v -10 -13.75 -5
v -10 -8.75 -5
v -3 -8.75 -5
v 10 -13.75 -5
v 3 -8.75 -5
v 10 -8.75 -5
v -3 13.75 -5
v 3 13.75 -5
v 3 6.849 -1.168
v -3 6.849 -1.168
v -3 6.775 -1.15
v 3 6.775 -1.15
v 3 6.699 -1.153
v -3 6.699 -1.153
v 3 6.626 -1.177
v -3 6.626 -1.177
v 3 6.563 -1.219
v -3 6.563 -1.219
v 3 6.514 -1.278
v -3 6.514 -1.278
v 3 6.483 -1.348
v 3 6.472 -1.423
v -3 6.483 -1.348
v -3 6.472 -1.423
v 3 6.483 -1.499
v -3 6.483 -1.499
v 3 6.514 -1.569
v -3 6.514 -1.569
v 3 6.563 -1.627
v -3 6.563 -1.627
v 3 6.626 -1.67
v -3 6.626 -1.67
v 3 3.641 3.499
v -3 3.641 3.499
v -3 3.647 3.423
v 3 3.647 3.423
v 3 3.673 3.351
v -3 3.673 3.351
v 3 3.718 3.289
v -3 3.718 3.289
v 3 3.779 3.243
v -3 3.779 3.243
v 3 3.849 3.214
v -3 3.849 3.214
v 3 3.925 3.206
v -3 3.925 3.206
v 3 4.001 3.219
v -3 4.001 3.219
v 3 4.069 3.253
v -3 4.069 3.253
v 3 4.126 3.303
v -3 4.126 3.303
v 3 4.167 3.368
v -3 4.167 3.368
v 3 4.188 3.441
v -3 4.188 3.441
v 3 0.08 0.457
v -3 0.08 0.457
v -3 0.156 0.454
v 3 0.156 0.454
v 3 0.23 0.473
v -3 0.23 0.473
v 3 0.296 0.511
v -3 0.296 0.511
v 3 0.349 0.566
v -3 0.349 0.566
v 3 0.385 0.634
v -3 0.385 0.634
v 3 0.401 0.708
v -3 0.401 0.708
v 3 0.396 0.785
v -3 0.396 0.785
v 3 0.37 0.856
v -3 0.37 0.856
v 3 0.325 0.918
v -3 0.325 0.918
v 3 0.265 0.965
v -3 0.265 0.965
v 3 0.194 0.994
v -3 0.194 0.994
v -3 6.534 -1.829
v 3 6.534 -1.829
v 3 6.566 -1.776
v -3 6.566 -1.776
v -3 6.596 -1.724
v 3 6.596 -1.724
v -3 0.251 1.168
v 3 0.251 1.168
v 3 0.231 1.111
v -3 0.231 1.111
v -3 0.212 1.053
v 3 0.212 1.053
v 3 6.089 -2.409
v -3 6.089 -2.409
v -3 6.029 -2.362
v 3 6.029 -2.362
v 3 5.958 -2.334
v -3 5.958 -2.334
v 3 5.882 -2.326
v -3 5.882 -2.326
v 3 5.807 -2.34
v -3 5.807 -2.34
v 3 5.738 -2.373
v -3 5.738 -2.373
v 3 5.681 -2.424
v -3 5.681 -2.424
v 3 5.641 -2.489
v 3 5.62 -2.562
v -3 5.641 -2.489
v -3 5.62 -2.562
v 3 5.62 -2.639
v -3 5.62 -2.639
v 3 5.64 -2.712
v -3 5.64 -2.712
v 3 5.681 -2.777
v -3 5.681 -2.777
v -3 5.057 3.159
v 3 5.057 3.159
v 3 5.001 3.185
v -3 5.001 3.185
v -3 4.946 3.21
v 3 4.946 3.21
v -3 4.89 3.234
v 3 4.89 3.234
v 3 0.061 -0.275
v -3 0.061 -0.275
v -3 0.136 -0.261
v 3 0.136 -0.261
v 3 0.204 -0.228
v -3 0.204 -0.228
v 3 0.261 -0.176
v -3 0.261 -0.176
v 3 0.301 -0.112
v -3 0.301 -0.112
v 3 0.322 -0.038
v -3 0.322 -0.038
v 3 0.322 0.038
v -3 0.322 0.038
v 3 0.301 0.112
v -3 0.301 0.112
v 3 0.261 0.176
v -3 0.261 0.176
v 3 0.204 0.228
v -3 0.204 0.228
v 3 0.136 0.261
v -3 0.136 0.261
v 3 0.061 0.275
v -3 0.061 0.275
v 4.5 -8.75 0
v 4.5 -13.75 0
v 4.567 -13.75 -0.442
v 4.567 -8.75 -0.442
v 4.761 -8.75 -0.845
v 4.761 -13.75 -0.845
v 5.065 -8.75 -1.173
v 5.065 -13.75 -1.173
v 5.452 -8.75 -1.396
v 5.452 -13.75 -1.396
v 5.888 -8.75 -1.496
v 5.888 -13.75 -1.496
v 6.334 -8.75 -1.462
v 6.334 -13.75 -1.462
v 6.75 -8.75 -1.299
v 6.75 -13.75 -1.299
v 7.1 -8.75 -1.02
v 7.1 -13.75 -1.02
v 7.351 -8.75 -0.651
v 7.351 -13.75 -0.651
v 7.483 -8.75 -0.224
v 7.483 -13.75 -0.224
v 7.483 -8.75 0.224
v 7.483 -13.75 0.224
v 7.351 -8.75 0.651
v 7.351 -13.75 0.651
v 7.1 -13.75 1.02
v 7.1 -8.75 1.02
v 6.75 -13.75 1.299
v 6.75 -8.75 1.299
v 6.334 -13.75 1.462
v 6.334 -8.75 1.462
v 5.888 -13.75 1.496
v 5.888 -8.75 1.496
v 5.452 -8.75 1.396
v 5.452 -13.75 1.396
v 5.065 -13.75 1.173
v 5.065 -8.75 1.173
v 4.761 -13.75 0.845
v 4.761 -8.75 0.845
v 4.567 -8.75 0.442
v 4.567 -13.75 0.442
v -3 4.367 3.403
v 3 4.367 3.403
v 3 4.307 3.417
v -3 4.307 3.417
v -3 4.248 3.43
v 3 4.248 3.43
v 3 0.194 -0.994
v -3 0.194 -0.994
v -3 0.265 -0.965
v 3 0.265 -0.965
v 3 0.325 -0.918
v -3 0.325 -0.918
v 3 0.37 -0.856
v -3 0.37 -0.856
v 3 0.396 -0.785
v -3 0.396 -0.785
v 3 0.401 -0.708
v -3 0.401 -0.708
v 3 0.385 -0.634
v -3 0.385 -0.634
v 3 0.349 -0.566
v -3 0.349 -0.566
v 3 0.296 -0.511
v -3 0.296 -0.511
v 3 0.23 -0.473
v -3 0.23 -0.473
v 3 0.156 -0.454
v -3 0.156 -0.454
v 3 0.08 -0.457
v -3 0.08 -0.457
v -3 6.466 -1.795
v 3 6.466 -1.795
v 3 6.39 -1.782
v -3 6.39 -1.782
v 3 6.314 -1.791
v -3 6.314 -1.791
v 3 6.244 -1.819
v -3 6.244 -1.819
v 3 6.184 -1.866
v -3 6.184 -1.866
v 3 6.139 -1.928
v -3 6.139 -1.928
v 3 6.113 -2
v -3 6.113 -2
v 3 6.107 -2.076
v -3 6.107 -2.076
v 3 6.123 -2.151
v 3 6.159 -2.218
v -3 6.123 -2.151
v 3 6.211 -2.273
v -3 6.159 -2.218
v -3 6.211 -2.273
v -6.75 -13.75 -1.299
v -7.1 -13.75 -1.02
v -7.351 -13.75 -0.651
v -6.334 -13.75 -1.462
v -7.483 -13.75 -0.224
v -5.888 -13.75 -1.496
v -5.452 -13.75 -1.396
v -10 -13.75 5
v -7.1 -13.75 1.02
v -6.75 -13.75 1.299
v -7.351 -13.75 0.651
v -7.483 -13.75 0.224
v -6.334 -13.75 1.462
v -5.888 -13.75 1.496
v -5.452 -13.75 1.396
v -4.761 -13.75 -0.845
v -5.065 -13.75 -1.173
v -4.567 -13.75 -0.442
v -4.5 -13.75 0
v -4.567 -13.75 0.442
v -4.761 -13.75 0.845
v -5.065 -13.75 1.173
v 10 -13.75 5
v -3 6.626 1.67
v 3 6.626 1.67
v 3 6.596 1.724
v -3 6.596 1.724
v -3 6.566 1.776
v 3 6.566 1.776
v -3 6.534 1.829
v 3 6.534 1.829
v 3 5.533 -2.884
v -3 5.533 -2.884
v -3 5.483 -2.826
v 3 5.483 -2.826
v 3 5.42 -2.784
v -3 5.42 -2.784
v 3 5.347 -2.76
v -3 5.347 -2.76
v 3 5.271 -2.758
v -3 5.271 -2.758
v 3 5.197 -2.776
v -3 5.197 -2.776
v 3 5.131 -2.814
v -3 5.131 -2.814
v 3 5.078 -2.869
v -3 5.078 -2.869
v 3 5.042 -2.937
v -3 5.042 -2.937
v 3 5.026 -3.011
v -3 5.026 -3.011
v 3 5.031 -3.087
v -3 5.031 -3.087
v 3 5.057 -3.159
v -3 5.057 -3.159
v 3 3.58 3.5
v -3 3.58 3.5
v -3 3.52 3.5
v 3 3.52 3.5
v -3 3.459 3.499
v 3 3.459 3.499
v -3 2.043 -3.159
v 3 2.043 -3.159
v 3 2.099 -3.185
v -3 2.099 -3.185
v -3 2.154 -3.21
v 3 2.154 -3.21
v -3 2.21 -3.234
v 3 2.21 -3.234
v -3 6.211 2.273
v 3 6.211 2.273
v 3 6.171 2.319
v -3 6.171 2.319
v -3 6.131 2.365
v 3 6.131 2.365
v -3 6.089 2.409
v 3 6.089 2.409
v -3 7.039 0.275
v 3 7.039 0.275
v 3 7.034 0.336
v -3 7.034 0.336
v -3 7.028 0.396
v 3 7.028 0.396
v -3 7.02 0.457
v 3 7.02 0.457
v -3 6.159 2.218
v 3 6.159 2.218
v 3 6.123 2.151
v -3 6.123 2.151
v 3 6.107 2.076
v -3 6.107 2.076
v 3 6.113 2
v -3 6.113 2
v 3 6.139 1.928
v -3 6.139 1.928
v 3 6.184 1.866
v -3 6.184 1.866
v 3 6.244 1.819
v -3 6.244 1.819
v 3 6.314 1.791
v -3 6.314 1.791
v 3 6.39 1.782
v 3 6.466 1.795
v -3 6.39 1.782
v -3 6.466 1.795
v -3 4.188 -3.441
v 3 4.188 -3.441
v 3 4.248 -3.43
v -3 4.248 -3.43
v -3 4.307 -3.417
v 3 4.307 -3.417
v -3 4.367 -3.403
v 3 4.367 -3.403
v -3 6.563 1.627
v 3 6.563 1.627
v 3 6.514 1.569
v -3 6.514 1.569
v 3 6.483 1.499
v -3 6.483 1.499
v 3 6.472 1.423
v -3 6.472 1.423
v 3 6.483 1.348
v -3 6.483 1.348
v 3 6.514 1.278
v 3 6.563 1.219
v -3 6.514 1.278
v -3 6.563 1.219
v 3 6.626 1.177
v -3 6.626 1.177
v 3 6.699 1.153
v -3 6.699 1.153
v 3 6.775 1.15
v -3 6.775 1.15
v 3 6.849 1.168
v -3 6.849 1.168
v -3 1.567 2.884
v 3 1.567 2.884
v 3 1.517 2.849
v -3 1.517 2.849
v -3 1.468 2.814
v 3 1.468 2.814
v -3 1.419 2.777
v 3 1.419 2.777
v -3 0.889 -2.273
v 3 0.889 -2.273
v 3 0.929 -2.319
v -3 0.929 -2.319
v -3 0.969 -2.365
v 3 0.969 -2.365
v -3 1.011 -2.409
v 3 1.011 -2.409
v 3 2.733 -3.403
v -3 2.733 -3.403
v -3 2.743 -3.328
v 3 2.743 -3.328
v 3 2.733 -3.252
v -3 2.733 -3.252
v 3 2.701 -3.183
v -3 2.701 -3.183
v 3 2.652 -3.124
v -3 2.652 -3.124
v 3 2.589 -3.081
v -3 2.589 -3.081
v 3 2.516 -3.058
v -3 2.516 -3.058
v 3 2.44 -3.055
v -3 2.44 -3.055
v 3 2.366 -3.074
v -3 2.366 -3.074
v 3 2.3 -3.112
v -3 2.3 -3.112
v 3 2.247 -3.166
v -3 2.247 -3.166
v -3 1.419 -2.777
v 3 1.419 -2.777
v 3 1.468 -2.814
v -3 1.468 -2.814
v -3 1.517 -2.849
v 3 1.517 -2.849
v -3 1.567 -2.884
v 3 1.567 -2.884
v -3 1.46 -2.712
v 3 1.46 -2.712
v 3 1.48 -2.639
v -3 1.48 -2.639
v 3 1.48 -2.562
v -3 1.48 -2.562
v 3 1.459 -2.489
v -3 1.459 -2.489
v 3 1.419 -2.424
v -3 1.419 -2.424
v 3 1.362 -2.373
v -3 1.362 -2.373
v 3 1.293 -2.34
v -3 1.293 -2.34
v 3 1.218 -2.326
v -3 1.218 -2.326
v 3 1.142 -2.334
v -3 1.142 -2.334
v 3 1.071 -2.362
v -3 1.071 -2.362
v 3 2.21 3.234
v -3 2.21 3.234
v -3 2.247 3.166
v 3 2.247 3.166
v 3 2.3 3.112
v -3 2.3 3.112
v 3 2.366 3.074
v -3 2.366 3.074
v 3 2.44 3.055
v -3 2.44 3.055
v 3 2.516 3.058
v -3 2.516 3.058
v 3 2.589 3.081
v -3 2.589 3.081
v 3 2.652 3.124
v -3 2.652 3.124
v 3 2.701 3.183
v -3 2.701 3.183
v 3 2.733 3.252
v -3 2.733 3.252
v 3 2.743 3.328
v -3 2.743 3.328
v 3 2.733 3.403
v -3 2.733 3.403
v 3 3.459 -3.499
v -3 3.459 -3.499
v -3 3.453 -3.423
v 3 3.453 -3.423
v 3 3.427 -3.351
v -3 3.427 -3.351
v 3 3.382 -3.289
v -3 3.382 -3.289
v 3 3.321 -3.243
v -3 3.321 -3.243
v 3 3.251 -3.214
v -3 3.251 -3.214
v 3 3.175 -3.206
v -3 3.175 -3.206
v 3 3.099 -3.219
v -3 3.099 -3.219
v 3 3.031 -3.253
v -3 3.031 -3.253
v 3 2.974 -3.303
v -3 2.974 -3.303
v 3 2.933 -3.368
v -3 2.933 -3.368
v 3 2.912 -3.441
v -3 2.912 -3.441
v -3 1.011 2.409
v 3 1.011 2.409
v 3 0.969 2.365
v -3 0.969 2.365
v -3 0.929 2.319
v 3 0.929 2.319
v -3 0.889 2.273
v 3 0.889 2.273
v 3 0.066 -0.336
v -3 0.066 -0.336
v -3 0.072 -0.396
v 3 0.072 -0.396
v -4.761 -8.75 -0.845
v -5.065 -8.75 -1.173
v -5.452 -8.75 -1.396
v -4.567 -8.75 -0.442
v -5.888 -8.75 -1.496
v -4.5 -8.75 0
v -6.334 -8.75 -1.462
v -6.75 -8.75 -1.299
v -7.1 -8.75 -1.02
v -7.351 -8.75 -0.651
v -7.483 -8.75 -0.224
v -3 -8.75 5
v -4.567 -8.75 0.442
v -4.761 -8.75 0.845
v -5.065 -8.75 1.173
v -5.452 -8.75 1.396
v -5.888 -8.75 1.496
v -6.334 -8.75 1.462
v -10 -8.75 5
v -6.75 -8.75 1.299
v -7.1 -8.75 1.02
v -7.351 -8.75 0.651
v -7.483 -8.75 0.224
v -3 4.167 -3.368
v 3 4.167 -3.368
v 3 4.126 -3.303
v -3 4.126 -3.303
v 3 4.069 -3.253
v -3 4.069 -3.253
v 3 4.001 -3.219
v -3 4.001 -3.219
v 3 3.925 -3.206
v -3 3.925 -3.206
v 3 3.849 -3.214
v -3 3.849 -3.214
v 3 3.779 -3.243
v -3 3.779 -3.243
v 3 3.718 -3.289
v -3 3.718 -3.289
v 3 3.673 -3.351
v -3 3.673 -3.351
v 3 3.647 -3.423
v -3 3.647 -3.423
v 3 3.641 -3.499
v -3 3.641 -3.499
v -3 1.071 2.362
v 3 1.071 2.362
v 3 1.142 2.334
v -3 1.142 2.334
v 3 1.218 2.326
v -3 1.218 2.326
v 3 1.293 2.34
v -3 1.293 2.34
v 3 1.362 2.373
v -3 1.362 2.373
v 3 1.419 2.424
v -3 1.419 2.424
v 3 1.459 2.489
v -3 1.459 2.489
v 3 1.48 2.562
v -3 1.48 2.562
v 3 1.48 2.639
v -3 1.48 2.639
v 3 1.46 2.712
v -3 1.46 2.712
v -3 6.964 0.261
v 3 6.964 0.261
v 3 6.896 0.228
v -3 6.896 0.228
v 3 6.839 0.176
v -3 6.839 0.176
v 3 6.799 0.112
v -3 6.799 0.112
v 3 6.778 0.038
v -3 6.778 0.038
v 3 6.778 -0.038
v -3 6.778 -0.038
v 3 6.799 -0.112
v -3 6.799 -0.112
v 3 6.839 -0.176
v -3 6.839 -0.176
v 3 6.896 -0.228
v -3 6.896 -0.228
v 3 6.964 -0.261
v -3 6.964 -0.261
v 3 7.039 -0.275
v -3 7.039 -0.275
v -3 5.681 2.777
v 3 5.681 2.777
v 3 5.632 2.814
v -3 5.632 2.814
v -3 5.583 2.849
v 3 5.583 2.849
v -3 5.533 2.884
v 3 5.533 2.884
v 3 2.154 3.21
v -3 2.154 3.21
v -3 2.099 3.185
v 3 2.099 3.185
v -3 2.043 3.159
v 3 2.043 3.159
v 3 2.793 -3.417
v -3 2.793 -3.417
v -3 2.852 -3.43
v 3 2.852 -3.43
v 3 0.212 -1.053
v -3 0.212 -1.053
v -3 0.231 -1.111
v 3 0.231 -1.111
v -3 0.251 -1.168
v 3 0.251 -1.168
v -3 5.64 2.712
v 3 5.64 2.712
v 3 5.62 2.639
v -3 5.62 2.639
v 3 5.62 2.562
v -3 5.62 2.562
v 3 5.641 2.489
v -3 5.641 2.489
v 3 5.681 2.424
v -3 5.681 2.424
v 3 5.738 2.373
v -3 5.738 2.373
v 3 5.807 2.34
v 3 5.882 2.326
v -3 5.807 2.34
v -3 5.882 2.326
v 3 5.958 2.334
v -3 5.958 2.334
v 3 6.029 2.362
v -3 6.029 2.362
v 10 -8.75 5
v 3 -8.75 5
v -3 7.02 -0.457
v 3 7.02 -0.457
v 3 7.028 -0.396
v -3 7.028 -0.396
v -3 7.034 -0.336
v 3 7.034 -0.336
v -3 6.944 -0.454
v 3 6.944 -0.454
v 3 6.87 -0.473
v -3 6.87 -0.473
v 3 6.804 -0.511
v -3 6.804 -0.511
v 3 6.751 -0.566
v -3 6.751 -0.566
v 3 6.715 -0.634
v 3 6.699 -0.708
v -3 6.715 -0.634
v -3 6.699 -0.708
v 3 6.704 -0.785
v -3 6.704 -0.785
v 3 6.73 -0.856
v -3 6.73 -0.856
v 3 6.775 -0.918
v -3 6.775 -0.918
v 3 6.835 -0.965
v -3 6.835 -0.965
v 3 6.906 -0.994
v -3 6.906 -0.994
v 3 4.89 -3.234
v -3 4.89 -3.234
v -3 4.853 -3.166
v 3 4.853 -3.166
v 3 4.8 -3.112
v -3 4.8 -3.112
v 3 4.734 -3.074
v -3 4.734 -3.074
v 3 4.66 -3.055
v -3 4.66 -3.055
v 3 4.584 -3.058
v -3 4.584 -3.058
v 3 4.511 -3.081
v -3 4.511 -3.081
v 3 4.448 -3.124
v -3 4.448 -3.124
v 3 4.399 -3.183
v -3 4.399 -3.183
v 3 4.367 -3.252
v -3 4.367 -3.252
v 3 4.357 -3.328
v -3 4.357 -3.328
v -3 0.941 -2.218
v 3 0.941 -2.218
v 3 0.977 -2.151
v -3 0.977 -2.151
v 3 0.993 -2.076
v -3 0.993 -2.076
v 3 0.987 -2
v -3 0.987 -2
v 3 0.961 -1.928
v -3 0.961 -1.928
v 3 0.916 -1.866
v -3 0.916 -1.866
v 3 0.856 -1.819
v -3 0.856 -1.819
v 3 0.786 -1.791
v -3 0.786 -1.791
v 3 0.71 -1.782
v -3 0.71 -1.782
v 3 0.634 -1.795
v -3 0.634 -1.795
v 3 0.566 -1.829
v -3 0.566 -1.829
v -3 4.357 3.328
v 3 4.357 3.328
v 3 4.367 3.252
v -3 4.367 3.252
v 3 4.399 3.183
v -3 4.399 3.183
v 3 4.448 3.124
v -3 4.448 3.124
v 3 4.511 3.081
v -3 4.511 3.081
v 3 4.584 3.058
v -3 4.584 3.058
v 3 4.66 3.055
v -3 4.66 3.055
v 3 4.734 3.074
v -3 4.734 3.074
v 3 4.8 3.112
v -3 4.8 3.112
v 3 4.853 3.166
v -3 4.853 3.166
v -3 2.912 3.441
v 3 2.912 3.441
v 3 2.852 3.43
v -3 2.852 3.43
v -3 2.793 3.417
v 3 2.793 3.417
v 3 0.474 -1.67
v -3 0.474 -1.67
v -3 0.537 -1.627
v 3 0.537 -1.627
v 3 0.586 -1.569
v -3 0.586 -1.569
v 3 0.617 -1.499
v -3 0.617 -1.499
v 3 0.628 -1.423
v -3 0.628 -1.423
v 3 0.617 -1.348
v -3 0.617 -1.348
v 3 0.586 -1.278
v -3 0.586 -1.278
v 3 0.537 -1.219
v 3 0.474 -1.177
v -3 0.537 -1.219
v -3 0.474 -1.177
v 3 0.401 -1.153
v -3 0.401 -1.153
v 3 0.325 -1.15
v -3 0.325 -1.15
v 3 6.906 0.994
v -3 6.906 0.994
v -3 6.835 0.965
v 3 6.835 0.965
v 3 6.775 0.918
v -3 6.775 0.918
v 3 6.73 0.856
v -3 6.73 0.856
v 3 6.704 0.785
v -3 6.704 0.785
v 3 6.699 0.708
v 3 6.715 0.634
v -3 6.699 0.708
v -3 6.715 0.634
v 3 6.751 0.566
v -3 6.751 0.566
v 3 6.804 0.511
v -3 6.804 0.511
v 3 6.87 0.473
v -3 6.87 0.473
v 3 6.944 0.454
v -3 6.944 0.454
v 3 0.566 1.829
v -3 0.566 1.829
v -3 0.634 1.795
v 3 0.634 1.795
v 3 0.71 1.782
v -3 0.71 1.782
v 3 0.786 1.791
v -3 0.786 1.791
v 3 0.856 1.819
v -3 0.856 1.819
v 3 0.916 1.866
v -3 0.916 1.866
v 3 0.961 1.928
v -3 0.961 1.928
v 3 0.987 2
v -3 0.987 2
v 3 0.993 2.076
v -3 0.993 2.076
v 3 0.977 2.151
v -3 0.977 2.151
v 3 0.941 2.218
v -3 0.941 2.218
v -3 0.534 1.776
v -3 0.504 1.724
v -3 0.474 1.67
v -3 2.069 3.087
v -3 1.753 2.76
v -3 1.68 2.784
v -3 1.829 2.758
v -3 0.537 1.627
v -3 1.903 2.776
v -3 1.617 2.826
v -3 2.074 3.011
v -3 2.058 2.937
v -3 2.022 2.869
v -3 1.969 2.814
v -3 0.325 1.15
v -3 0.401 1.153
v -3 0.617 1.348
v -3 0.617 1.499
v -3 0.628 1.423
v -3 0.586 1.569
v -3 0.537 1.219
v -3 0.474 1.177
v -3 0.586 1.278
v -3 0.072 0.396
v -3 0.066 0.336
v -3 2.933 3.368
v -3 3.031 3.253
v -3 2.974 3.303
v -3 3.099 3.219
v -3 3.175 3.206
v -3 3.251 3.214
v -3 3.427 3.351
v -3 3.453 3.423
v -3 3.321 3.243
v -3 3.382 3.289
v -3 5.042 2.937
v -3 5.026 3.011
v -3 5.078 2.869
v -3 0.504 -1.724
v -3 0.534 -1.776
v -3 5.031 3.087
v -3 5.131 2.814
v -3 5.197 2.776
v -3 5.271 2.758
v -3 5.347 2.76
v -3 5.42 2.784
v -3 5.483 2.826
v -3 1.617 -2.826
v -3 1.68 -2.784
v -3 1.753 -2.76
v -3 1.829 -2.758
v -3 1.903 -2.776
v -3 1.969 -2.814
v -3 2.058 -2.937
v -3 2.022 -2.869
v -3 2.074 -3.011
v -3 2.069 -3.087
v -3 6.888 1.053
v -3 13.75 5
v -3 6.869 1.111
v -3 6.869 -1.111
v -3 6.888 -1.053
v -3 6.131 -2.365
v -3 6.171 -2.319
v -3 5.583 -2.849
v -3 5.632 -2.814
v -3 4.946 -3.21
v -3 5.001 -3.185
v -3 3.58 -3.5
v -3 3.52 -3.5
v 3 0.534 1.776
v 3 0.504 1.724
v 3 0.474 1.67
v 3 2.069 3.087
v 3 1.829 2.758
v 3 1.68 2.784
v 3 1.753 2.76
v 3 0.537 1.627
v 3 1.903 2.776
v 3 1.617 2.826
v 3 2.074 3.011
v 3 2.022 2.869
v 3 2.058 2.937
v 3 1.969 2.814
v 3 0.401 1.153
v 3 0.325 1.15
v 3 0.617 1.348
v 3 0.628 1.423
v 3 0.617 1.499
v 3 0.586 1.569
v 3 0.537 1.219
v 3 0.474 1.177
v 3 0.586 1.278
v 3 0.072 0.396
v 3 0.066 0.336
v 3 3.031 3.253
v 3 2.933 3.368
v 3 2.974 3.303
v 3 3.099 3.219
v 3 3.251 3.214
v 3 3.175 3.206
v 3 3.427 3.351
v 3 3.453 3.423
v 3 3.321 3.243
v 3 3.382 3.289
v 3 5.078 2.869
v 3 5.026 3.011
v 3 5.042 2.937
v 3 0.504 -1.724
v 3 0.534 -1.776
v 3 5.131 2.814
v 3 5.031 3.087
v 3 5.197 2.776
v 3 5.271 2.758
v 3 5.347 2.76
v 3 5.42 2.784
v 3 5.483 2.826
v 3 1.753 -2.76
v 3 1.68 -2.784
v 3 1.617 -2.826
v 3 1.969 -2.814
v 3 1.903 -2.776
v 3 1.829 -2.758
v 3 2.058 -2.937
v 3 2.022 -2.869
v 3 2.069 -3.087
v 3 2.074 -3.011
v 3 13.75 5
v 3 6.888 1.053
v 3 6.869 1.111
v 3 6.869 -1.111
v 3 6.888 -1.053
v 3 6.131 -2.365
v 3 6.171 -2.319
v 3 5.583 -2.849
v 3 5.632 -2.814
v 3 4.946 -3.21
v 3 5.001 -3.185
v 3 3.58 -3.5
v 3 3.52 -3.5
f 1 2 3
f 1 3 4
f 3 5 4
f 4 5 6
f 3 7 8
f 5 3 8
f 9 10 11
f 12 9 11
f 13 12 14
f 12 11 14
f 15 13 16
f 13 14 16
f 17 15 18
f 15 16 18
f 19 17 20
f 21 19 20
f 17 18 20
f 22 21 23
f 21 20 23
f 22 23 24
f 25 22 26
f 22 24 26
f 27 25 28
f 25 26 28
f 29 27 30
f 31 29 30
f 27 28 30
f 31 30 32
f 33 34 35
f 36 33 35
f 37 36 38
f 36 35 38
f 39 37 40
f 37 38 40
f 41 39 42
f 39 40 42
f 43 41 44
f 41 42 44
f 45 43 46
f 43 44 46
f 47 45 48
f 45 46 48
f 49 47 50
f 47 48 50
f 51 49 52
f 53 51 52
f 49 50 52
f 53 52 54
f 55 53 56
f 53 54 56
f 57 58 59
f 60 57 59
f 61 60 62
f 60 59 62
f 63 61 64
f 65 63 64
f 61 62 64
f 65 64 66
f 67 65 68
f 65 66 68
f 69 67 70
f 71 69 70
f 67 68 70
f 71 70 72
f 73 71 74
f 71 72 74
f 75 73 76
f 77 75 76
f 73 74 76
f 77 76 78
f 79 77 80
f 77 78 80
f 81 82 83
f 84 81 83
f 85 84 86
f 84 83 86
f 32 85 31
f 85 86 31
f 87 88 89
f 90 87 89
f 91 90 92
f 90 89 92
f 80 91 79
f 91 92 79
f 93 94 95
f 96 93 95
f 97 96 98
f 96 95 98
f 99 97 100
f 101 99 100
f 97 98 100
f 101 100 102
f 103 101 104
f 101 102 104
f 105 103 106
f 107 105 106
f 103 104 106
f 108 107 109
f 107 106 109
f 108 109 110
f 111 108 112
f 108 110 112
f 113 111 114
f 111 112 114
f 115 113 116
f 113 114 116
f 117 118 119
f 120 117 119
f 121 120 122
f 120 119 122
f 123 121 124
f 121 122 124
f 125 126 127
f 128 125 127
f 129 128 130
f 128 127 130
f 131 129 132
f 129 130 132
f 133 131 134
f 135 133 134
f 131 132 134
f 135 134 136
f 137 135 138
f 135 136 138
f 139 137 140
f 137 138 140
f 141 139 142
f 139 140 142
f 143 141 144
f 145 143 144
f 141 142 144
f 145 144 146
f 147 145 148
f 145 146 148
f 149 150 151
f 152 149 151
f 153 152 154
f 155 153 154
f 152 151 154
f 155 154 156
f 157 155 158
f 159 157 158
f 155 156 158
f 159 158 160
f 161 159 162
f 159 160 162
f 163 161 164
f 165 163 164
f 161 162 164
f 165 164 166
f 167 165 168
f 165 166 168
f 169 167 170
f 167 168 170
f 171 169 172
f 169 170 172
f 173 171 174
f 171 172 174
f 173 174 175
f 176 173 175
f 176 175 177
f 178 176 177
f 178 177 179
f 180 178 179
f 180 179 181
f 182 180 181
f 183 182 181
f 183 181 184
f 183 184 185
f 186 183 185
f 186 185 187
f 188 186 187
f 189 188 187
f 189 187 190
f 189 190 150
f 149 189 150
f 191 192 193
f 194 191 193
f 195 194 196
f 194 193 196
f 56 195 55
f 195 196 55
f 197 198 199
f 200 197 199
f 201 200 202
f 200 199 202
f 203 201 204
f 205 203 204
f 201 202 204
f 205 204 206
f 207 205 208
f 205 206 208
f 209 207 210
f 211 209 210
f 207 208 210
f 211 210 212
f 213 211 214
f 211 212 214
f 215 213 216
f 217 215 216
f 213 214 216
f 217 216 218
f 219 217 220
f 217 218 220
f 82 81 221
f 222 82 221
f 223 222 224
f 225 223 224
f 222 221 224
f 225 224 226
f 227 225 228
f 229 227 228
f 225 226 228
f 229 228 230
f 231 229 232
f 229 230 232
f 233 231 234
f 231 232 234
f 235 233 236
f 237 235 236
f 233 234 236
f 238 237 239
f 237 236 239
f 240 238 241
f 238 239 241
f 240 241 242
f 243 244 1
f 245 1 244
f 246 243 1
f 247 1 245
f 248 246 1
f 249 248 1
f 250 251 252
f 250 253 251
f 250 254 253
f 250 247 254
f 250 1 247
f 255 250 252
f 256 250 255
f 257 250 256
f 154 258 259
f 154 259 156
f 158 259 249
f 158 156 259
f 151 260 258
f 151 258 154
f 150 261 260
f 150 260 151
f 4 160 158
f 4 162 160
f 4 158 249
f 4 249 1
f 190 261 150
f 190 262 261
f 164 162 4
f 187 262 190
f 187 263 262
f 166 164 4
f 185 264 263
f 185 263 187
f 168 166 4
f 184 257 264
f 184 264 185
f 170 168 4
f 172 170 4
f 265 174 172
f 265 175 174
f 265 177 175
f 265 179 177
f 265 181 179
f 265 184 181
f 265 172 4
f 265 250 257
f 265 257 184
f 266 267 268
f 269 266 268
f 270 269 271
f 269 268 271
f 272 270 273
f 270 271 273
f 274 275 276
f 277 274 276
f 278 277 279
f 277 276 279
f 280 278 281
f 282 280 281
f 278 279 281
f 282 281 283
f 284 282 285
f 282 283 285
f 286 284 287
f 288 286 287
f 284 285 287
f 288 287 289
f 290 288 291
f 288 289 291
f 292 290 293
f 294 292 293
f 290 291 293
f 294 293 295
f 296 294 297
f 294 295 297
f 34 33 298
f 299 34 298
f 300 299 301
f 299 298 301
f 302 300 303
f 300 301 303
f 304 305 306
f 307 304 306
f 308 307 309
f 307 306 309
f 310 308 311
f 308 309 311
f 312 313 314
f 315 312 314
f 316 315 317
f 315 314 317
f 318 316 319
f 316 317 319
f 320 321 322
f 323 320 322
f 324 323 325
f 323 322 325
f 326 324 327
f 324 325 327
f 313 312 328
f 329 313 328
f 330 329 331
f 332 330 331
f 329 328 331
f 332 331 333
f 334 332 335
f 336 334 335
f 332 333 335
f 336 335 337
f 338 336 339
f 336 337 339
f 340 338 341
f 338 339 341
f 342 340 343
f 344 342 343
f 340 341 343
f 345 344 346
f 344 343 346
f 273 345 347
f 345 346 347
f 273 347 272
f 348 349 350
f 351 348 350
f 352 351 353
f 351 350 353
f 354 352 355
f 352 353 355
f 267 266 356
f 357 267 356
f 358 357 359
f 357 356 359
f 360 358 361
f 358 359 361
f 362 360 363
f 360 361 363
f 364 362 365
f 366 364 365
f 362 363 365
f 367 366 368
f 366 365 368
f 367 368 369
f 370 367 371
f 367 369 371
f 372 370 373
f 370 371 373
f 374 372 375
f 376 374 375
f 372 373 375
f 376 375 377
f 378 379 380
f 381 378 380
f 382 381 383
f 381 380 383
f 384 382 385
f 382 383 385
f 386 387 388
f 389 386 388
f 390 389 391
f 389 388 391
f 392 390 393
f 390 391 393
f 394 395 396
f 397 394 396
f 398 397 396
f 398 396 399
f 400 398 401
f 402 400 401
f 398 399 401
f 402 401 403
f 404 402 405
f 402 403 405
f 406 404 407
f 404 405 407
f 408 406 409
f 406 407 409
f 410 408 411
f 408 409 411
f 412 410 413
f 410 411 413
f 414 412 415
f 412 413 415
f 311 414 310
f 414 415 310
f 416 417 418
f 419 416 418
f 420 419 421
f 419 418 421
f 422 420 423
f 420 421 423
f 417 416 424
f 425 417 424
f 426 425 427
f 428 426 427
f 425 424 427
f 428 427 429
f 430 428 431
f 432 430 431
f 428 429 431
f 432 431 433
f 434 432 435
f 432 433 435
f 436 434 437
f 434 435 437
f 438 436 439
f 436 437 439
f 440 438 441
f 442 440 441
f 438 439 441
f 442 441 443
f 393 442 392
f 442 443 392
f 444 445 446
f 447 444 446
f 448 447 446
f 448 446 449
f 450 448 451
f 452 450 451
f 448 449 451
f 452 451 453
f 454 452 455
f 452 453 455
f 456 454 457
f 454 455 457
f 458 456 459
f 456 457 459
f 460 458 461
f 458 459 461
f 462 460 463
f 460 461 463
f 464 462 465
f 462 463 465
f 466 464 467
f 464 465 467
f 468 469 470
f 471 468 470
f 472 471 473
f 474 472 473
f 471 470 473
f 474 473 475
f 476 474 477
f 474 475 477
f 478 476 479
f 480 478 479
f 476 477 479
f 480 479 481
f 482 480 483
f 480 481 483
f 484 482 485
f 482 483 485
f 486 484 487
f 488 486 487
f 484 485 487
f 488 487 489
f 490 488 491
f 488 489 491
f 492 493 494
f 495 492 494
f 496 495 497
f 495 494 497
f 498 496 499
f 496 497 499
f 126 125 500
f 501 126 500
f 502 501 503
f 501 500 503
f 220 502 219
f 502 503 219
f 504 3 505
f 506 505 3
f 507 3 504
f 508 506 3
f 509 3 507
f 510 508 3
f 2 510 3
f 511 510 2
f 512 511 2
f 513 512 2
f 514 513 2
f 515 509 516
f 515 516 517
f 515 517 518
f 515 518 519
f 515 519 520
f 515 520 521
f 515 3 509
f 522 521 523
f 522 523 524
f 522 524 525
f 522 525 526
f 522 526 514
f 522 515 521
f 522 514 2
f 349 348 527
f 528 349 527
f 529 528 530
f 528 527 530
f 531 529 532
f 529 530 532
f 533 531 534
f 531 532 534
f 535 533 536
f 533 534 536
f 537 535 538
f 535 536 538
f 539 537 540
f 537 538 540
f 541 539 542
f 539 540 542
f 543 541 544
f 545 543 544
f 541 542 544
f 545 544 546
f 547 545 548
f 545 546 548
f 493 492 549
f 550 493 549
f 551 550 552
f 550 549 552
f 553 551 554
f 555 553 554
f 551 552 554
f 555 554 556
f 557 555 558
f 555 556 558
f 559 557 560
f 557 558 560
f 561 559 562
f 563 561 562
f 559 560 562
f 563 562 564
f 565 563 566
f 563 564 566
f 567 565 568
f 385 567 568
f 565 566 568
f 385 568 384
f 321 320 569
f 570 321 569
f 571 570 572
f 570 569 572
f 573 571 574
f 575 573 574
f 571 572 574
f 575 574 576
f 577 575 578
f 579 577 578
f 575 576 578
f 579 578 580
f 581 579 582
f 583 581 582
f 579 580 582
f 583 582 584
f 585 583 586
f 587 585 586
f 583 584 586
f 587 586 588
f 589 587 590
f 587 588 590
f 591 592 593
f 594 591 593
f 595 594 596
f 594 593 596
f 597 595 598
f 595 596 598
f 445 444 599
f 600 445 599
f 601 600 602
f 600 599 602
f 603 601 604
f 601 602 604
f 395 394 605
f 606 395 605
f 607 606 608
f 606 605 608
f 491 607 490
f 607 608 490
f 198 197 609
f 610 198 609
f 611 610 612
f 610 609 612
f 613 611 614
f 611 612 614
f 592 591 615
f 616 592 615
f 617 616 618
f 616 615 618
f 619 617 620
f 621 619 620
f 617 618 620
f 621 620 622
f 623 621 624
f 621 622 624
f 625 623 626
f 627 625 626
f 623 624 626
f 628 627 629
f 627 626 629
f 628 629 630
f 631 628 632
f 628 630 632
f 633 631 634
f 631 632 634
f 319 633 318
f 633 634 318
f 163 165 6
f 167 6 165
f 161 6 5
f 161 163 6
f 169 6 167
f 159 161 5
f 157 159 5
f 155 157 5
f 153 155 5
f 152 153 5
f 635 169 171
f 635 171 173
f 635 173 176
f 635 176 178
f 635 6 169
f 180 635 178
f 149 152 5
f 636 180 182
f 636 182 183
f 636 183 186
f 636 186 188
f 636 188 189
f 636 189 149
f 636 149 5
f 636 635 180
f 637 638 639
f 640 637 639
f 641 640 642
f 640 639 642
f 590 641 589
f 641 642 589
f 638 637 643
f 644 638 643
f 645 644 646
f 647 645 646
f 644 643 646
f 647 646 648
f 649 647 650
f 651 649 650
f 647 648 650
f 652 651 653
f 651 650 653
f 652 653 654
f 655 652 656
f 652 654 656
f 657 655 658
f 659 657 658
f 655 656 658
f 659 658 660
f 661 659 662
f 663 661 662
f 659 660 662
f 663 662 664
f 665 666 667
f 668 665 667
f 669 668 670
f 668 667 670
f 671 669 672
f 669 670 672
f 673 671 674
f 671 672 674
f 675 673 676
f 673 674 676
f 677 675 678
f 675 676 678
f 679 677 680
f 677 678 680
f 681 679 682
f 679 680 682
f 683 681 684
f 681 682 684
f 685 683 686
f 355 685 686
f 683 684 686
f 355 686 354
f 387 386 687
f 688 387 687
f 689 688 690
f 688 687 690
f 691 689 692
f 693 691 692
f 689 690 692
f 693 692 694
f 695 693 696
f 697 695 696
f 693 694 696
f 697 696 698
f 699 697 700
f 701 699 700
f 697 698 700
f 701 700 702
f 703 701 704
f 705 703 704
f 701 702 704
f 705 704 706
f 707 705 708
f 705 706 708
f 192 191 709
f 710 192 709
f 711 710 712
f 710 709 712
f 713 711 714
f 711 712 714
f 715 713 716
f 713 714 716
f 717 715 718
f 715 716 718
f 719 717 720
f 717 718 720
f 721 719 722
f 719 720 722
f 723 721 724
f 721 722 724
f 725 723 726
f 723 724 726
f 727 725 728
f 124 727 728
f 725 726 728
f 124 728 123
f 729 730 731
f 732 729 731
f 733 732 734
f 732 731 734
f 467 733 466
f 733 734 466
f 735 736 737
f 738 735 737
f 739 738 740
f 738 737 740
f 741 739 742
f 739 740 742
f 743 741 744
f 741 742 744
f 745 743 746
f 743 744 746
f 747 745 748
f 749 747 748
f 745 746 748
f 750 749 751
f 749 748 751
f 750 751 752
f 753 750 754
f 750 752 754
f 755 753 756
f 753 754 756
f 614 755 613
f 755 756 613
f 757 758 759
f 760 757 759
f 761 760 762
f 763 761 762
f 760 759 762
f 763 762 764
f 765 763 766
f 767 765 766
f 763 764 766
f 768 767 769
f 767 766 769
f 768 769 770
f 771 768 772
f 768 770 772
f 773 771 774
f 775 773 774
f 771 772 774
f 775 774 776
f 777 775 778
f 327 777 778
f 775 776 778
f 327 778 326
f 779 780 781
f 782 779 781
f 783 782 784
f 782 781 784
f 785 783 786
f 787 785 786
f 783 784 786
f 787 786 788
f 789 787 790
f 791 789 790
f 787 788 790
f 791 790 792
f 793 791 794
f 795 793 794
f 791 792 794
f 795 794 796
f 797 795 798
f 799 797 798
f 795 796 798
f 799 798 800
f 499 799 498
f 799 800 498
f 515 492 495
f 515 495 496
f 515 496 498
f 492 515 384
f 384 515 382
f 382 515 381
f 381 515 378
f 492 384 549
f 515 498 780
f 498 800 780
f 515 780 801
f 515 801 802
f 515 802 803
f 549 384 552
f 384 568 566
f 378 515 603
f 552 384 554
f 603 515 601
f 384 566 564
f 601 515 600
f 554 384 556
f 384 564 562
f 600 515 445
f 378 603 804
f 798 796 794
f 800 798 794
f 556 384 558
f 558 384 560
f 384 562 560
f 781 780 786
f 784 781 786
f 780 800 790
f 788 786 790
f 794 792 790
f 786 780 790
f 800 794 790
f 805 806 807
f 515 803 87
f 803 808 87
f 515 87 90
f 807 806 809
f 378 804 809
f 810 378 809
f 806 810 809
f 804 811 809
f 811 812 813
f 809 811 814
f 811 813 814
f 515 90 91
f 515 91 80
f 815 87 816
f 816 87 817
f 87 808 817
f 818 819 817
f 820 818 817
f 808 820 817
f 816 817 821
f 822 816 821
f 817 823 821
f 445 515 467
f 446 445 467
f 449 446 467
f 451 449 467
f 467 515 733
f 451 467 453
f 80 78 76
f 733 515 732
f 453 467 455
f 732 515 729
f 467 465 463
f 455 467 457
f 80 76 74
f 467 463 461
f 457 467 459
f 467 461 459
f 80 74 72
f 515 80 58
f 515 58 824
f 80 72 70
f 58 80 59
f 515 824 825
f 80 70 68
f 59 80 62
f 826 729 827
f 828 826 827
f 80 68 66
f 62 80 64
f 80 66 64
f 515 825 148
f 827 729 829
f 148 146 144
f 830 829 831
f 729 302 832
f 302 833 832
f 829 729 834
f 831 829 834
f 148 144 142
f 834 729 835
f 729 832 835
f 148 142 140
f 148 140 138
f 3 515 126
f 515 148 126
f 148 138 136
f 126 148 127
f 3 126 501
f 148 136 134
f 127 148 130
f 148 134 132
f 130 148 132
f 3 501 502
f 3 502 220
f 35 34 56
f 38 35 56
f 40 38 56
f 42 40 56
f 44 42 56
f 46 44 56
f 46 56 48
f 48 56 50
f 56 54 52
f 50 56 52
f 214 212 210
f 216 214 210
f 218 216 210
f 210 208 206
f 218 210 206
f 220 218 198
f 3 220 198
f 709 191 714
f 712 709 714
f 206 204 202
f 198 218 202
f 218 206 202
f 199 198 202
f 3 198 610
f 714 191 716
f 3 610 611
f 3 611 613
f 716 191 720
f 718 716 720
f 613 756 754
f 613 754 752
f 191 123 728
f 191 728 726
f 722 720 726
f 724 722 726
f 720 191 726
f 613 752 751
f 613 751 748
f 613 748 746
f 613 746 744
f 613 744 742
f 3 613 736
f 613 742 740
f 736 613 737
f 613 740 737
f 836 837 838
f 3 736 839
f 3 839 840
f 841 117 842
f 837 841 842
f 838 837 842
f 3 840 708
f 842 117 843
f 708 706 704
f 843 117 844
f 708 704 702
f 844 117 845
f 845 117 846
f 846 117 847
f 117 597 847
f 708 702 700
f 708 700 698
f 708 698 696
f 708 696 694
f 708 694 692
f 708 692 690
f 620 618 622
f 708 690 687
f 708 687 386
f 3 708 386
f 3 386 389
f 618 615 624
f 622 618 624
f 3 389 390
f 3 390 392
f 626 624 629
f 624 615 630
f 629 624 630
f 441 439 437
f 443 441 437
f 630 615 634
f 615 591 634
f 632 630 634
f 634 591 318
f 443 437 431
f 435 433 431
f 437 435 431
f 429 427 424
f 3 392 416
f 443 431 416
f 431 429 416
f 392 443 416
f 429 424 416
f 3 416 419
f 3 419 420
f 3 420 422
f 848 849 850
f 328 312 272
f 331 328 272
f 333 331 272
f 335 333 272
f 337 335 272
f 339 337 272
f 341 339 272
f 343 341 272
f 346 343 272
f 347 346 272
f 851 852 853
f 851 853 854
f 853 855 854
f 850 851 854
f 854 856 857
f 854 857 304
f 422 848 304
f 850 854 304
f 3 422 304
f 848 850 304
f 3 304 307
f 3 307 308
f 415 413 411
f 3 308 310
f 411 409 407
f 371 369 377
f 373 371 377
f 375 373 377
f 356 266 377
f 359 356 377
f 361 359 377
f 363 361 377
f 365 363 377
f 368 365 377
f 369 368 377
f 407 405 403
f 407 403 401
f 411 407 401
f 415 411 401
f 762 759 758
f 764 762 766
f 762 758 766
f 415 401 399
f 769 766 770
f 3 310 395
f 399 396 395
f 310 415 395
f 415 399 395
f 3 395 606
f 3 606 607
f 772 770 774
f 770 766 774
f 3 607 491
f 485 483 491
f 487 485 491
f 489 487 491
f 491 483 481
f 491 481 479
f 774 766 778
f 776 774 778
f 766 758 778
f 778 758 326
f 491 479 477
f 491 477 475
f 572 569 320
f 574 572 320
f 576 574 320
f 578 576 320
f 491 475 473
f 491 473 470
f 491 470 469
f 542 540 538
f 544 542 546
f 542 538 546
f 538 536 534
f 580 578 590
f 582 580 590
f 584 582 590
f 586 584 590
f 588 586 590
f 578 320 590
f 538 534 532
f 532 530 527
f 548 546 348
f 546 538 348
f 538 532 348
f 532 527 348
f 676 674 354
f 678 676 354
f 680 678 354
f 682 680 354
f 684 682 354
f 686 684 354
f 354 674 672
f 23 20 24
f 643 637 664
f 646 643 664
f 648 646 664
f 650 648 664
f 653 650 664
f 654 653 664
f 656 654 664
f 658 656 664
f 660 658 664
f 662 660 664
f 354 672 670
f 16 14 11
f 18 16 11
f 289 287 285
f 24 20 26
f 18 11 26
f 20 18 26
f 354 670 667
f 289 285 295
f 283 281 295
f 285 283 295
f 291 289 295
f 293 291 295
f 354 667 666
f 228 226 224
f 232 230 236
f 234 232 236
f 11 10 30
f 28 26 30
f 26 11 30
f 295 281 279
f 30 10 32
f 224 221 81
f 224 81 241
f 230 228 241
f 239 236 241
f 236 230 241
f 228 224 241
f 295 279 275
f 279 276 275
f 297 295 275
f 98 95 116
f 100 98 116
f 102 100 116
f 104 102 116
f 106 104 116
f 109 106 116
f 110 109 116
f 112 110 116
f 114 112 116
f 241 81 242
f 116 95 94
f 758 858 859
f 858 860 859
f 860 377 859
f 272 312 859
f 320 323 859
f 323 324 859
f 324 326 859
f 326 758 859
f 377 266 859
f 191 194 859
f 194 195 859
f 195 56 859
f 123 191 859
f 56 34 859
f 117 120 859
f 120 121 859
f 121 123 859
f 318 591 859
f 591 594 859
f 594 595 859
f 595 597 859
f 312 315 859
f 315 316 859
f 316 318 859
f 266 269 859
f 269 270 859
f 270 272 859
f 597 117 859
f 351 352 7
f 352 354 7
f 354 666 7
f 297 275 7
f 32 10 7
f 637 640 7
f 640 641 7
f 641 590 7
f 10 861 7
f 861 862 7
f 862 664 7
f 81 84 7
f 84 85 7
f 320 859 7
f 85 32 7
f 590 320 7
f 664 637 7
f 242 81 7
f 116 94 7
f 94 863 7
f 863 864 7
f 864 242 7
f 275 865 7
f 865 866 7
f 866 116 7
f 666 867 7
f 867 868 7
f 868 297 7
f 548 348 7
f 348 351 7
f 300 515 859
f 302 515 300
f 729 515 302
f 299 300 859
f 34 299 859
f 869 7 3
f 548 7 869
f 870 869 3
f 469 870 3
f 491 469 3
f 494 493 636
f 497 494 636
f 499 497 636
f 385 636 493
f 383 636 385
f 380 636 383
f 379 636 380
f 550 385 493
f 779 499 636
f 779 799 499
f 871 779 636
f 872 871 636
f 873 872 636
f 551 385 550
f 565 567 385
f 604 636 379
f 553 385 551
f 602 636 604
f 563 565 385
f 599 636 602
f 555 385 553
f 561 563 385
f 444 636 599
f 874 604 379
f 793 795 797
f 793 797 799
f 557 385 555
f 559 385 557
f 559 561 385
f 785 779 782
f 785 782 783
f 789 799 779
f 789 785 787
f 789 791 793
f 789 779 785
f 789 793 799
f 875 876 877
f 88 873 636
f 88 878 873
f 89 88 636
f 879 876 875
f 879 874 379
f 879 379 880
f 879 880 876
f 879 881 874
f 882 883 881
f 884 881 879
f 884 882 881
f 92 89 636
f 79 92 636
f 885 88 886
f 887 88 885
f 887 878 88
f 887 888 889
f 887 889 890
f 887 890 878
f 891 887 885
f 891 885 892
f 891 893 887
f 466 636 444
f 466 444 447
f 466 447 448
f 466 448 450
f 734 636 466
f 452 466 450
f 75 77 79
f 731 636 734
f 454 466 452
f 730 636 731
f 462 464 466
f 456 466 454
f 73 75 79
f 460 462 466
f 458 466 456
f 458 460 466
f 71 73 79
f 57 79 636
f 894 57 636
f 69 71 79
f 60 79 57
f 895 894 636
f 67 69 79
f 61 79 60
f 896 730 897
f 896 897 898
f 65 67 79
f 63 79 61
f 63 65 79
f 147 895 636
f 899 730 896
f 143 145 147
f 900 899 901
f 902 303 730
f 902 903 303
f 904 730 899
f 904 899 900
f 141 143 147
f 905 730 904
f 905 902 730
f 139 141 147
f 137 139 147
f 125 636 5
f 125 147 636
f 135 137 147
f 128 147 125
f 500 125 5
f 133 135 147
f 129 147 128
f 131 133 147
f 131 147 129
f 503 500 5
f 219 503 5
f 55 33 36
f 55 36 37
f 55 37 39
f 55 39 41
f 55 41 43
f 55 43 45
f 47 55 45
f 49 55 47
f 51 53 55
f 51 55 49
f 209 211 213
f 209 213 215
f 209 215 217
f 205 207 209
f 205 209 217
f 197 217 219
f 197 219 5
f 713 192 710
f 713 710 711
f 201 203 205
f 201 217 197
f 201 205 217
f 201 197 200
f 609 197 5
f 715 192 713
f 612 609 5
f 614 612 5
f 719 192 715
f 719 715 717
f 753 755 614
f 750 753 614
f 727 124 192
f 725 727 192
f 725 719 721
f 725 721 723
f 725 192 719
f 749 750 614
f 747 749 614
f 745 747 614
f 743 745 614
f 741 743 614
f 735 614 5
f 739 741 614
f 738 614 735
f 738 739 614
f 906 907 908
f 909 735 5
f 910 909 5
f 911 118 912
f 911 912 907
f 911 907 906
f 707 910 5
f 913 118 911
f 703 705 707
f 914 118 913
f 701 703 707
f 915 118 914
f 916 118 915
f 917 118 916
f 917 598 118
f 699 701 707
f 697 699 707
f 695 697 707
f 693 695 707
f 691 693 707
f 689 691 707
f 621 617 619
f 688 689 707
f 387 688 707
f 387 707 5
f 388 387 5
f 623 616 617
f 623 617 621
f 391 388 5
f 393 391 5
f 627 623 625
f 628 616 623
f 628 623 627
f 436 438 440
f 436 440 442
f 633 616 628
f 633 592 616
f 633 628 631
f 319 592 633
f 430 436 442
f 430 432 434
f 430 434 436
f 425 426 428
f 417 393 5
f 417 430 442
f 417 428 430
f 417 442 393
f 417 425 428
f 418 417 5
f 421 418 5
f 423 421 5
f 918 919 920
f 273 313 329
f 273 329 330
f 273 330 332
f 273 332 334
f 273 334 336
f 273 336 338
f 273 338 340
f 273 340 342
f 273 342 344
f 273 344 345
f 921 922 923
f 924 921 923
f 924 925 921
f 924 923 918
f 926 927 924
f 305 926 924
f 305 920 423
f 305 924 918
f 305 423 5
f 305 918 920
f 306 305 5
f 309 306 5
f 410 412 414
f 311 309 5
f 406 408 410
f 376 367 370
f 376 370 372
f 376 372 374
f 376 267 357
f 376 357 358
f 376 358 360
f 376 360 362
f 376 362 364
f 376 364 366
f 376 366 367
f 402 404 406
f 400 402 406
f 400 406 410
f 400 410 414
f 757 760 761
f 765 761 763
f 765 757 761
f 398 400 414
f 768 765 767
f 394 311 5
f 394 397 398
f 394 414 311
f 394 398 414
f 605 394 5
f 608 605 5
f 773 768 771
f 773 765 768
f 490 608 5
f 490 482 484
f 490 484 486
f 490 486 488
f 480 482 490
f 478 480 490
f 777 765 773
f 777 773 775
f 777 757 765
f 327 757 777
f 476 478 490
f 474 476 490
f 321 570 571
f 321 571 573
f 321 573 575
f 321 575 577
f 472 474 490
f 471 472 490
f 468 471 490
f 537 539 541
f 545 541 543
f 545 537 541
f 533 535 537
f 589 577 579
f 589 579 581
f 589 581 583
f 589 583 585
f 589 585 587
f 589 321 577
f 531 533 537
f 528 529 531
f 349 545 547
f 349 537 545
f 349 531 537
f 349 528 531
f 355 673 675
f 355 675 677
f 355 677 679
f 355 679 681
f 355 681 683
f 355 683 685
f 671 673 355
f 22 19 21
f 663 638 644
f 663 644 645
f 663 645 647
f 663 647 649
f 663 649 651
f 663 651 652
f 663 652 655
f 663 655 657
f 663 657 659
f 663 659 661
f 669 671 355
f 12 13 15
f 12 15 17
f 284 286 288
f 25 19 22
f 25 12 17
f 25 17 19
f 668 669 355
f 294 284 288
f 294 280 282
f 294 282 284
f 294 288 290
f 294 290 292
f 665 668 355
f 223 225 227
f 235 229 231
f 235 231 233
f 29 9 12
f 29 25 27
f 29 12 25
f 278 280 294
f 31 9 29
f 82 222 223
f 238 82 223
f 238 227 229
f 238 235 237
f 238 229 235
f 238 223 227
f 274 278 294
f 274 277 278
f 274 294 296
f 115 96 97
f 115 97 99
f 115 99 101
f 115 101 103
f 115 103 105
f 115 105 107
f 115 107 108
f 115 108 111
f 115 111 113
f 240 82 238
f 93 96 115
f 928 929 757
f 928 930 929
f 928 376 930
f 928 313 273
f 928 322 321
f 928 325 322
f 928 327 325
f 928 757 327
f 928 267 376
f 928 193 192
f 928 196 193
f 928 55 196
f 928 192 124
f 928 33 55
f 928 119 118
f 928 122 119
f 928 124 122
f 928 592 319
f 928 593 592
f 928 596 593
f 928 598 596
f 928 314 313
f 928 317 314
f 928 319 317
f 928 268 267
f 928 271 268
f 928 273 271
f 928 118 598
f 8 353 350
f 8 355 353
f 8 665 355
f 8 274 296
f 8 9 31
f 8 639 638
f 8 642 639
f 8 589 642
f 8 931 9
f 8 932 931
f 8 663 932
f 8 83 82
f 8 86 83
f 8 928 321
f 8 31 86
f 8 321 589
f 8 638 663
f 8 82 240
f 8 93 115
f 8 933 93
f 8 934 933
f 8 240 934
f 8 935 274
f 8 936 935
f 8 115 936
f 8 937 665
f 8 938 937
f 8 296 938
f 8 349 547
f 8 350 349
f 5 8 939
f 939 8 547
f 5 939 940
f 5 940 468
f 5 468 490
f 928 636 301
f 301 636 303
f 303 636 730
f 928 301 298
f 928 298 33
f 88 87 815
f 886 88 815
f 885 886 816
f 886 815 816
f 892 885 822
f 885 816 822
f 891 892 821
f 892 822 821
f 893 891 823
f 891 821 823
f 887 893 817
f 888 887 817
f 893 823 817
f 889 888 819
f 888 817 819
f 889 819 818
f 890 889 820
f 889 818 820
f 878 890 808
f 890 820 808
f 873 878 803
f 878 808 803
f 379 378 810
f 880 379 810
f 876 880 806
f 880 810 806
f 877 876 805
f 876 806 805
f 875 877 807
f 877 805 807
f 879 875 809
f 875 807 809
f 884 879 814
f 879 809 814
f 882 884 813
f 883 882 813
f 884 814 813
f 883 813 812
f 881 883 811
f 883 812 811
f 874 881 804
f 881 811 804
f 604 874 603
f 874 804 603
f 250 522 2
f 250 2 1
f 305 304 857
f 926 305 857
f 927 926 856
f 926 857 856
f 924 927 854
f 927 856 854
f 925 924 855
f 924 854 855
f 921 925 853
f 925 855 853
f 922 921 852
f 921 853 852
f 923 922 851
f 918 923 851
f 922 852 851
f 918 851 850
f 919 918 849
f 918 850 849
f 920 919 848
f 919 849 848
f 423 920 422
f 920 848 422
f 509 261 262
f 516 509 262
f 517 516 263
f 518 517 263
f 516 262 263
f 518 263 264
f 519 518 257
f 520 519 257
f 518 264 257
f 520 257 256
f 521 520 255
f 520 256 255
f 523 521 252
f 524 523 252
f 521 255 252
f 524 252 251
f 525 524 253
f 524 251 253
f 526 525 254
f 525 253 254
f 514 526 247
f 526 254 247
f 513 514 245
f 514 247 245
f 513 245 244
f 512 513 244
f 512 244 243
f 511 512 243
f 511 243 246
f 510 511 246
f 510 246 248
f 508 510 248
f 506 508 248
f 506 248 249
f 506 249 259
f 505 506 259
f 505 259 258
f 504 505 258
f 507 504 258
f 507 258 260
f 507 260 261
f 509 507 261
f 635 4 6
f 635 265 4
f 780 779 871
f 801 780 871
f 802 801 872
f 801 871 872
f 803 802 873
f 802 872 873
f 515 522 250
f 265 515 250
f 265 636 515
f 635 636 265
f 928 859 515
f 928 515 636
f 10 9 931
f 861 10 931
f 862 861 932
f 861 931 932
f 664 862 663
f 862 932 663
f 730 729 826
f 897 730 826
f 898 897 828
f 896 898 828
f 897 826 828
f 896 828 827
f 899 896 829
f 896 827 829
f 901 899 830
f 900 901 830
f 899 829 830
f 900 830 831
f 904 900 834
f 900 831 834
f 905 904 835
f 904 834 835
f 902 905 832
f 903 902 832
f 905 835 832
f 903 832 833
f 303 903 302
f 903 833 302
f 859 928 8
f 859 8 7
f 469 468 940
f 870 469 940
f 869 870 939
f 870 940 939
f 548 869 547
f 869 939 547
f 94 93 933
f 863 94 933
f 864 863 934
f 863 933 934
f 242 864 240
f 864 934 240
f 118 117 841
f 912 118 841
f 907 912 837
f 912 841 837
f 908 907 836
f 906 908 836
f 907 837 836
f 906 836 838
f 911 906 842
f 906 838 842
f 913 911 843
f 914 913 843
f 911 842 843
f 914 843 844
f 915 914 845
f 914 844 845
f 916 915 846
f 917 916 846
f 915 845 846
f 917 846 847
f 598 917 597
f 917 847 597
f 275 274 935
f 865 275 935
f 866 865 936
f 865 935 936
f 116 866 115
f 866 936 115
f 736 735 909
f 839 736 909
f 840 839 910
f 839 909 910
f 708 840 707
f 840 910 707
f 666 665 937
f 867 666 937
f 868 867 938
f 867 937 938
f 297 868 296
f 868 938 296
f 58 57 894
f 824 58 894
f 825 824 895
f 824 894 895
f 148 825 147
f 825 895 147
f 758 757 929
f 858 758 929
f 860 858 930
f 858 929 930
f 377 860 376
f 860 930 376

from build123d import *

# Parameters (mm, degrees)
SALIENTE_EXTRUIR1_DEPTH      = 5
CROQUIS4_R                   = 3.5
CORTAR_EXTRUIR3_DEPTH        = 15
CROQUIS5_R                   = 1.5
CORTAR_EXTRUIR4_DEPTH        = 10
SALIENTE_EXTRUIR2_DEPTH      = 3
SALIENTE_EXTRUIR2_DEPTH_BACK = 3


with BuildPart() as part:
    # Croquis1 → Saliente-Extruir1 (new, symmetric)
    with BuildSketch(Plane.XY):
        Polygon((3, -8.75), (3, 13.75), (0, 13.75), (0, -13.75), (10, -13.75), (10, -8.75), align=None)
        Polygon((0, -13.75), (0, 13.75), (-3, 13.75), (-3, -8.75), (-10, -8.75), (-10, -13.75), align=None)
    extrude(amount=SALIENTE_EXTRUIR1_DEPTH, both=True)

    # Croquis4 → Cortar-Extruir3 (cut)
    with BuildSketch(Plane(origin=(3, 0, 0), x_dir=(0, 0, -1), z_dir=(1, 0, 0))):
        with Locations(Location((0, 3.55, 0), (0, 0, 90))):
            Circle(CROQUIS4_R)
    extrude(amount=-CORTAR_EXTRUIR3_DEPTH, mode=Mode.SUBTRACT)

    # Croquis5 → Cortar-Extruir4 (cut)
    with BuildSketch(Plane.XZ.offset(13.75)):
        with Locations((-6, 0)):
            Circle(CROQUIS5_R)
        with Locations(Location((6, 0, 0), (0, 0, 180))):
            Circle(CROQUIS5_R)
    extrude(amount=-CORTAR_EXTRUIR4_DEPTH, mode=Mode.SUBTRACT)

    # Croquis6 → Saliente-Extruir2 (add, two sides: drawn at the far end of the back side and taken through both)
    with BuildSketch(Plane(origin=(0, 0, 0), x_dir=(0, 0, -1), z_dir=(1, 0, 0)).offset(-SALIENTE_EXTRUIR2_DEPTH_BACK)):
        with BuildLine():
            ThreePointArc((0.274787705, 7.039196429), (0, 7.05), (-0.274787705, 7.039196429))
            ThreePointArc((-0.274787705, 7.039196429), (0, 6.775), (0.274787705, 7.039196429))
        make_face()
        with BuildLine():
            ThreePointArc((0.994227663, 6.905817539), (0.727690918, 6.973516603), (0.456661795, 7.020080691))
            ThreePointArc((0.456661795, 7.020080691), (0.670515203, 6.704526012), (0.994227663, 6.905817539))
        make_face()
        with BuildLine():
            ThreePointArc((1.670215102, 6.625773319), (1.423578251, 6.747409102), (1.168152983, 6.849305777))
            ThreePointArc((1.168152983, 6.849305777), (1.311725674, 6.496184101), (1.670215102, 6.625773319))
        make_face()
        with BuildLine():
            ThreePointArc((2.273206126, 6.211303047), (2.057248383, 6.38155948), (1.82859028, 6.534335368))
            ThreePointArc((1.82859028, 6.534335368), (1.895607439, 6.159079807), (2.273206126, 6.211303047))
        make_face()
        with BuildLine():
            ThreePointArc((2.776847135, 5.680521061), (2.601006889, 5.891957122), (2.409109407, 6.088935183))
            ThreePointArc((2.409109407, 6.088935183), (2.396642062, 5.707946206), (2.776847135, 5.680521061))
        make_face()
        with BuildLine():
            ThreePointArc((3.159126598, 5.056625081), (3.031088913, 5.3), (2.884338893, 5.532571348))
            ThreePointArc((2.884338893, 5.532571348), (2.792931927, 5.1625), (3.159126598, 5.056625081))
        make_face()
        with BuildLine():
            ThreePointArc((3.403337071, 4.366882356), (3.328697807, 4.63155948), (3.233508929, 4.889559631))
            ThreePointArc((3.233508929, 4.889559631), (3.067157265, 4.546579807), (3.403337071, 4.366882356))
        make_face()
        with BuildLine():
            ThreePointArc((3.498805382, 3.641437951), (3.480826634, 3.915849621), (3.441359109, 4.18800273))
            ThreePointArc((3.441359109, 4.18800273), (3.207333113, 3.887104294), (3.498805382, 3.641437951))
        make_face()
        with BuildLine():
            ThreePointArc((3.441359109, 2.91199727), (3.480826634, 3.184150379), (3.498805382, 3.458562049))
            ThreePointArc((3.498805382, 3.458562049), (3.207333113, 3.212895706), (3.441359109, 2.91199727))
        make_face()
        with BuildLine():
            ThreePointArc((3.233508929, 2.210440369), (3.328697807, 2.46844052), (3.403337071, 2.733117644))
            ThreePointArc((3.403337071, 2.733117644), (3.067157265, 2.553420193), (3.233508929, 2.210440369))
        make_face()
        with BuildLine():
            ThreePointArc((2.884338893, 1.567428652), (3.031088913, 1.8), (3.159126598, 2.043374919))
            ThreePointArc((3.159126598, 2.043374919), (2.792931927, 1.9375), (2.884338893, 1.567428652))
        make_face()
        with BuildLine():
            ThreePointArc((2.409109407, 1.011064817), (2.601006889, 1.208042878), (2.776847135, 1.419478939))
            ThreePointArc((2.776847135, 1.419478939), (2.396642062, 1.392053794), (2.409109407, 1.011064817))
        make_face()
        with BuildLine():
            ThreePointArc((1.82859028, 0.565664632), (2.057248383, 0.71844052), (2.273206126, 0.888696953))
            ThreePointArc((2.273206126, 0.888696953), (1.895607439, 0.940920193), (1.82859028, 0.565664632))
        make_face()
        with BuildLine():
            ThreePointArc((1.168152983, 0.250694223), (1.423578251, 0.352590898), (1.670215102, 0.474226681))
            ThreePointArc((1.670215102, 0.474226681), (1.311725674, 0.603815899), (1.168152983, 0.250694223))
        make_face()
        with BuildLine():
            ThreePointArc((0.456661795, 0.079919309), (0.727690918, 0.126483397), (0.994227663, 0.194182461))
            ThreePointArc((0.994227663, 0.194182461), (0.670515203, 0.395473988), (0.456661795, 0.079919309))
        make_face()
        with BuildLine():
            ThreePointArc((-0.274787705, 0.060803571), (0, 0.05), (0.274787705, 0.060803571))
            ThreePointArc((0.274787705, 0.060803571), (0, 0.325), (-0.274787705, 0.060803571))
        make_face()
        with BuildLine():
            ThreePointArc((-0.994227663, 0.194182461), (-0.727690918, 0.126483397), (-0.456661795, 0.079919309))
            ThreePointArc((-0.456661795, 0.079919309), (-0.670515203, 0.395473988), (-0.994227663, 0.194182461))
        make_face()
        with BuildLine():
            ThreePointArc((-1.670215102, 0.474226681), (-1.423578251, 0.352590898), (-1.168152983, 0.250694223))
            ThreePointArc((-1.168152983, 0.250694223), (-1.311725674, 0.603815899), (-1.670215102, 0.474226681))
        make_face()
        with BuildLine():
            ThreePointArc((-2.273206126, 0.888696953), (-2.057248383, 0.71844052), (-1.82859028, 0.565664632))
            ThreePointArc((-1.82859028, 0.565664632), (-1.895607439, 0.940920193), (-2.273206126, 0.888696953))
        make_face()
        with BuildLine():
            ThreePointArc((-2.776847135, 1.419478939), (-2.601006889, 1.208042878), (-2.409109407, 1.011064817))
            ThreePointArc((-2.409109407, 1.011064817), (-2.396642062, 1.392053794), (-2.776847135, 1.419478939))
        make_face()
        with BuildLine():
            ThreePointArc((-3.159126598, 2.043374919), (-3.031088913, 1.8), (-2.884338893, 1.567428652))
            ThreePointArc((-2.884338893, 1.567428652), (-2.792931927, 1.9375), (-3.159126598, 2.043374919))
        make_face()
        with BuildLine():
            ThreePointArc((-3.403337071, 2.733117644), (-3.328697807, 2.46844052), (-3.233508929, 2.210440369))
            ThreePointArc((-3.233508929, 2.210440369), (-3.067157265, 2.553420193), (-3.403337071, 2.733117644))
        make_face()
        with BuildLine():
            ThreePointArc((-3.498805382, 3.458562049), (-3.480826634, 3.184150379), (-3.441359109, 2.91199727))
            ThreePointArc((-3.441359109, 2.91199727), (-3.207333113, 3.212895706), (-3.498805382, 3.458562049))
        make_face()
        with BuildLine():
            ThreePointArc((-3.441359109, 4.18800273), (-3.480826634, 3.915849621), (-3.498805382, 3.641437951))
            ThreePointArc((-3.498805382, 3.641437951), (-3.207333113, 3.887104294), (-3.441359109, 4.18800273))
        make_face()
        with BuildLine():
            ThreePointArc((-3.233508929, 4.889559631), (-3.328697807, 4.63155948), (-3.403337071, 4.366882356))
            ThreePointArc((-3.403337071, 4.366882356), (-3.067157265, 4.546579807), (-3.233508929, 4.889559631))
        make_face()
        with BuildLine():
            ThreePointArc((-2.884338893, 5.532571348), (-3.031088913, 5.3), (-3.159126598, 5.056625081))
            ThreePointArc((-3.159126598, 5.056625081), (-2.792931927, 5.1625), (-2.884338893, 5.532571348))
        make_face()
        with BuildLine():
            ThreePointArc((-2.409109407, 6.088935183), (-2.601006889, 5.891957122), (-2.776847135, 5.680521061))
            ThreePointArc((-2.776847135, 5.680521061), (-2.396642062, 5.707946206), (-2.409109407, 6.088935183))
        make_face()
        with BuildLine():
            ThreePointArc((-1.82859028, 6.534335368), (-2.057248383, 6.38155948), (-2.273206126, 6.211303047))
            ThreePointArc((-2.273206126, 6.211303047), (-1.895607439, 6.159079807), (-1.82859028, 6.534335368))
        make_face()
        with BuildLine():
            ThreePointArc((-1.168152983, 6.849305777), (-1.423578251, 6.747409102), (-1.670215102, 6.625773319))
            ThreePointArc((-1.670215102, 6.625773319), (-1.311725674, 6.496184101), (-1.168152983, 6.849305777))
        make_face()
        with BuildLine():
            ThreePointArc((-0.456661795, 7.020080691), (-0.727690918, 6.973516603), (-0.994227663, 6.905817539))
            ThreePointArc((-0.994227663, 6.905817539), (-0.670515203, 6.704526012), (-0.456661795, 7.020080691))
        make_face()
    extrude(amount=SALIENTE_EXTRUIR2_DEPTH + SALIENTE_EXTRUIR2_DEPTH_BACK)


solid = part.part
